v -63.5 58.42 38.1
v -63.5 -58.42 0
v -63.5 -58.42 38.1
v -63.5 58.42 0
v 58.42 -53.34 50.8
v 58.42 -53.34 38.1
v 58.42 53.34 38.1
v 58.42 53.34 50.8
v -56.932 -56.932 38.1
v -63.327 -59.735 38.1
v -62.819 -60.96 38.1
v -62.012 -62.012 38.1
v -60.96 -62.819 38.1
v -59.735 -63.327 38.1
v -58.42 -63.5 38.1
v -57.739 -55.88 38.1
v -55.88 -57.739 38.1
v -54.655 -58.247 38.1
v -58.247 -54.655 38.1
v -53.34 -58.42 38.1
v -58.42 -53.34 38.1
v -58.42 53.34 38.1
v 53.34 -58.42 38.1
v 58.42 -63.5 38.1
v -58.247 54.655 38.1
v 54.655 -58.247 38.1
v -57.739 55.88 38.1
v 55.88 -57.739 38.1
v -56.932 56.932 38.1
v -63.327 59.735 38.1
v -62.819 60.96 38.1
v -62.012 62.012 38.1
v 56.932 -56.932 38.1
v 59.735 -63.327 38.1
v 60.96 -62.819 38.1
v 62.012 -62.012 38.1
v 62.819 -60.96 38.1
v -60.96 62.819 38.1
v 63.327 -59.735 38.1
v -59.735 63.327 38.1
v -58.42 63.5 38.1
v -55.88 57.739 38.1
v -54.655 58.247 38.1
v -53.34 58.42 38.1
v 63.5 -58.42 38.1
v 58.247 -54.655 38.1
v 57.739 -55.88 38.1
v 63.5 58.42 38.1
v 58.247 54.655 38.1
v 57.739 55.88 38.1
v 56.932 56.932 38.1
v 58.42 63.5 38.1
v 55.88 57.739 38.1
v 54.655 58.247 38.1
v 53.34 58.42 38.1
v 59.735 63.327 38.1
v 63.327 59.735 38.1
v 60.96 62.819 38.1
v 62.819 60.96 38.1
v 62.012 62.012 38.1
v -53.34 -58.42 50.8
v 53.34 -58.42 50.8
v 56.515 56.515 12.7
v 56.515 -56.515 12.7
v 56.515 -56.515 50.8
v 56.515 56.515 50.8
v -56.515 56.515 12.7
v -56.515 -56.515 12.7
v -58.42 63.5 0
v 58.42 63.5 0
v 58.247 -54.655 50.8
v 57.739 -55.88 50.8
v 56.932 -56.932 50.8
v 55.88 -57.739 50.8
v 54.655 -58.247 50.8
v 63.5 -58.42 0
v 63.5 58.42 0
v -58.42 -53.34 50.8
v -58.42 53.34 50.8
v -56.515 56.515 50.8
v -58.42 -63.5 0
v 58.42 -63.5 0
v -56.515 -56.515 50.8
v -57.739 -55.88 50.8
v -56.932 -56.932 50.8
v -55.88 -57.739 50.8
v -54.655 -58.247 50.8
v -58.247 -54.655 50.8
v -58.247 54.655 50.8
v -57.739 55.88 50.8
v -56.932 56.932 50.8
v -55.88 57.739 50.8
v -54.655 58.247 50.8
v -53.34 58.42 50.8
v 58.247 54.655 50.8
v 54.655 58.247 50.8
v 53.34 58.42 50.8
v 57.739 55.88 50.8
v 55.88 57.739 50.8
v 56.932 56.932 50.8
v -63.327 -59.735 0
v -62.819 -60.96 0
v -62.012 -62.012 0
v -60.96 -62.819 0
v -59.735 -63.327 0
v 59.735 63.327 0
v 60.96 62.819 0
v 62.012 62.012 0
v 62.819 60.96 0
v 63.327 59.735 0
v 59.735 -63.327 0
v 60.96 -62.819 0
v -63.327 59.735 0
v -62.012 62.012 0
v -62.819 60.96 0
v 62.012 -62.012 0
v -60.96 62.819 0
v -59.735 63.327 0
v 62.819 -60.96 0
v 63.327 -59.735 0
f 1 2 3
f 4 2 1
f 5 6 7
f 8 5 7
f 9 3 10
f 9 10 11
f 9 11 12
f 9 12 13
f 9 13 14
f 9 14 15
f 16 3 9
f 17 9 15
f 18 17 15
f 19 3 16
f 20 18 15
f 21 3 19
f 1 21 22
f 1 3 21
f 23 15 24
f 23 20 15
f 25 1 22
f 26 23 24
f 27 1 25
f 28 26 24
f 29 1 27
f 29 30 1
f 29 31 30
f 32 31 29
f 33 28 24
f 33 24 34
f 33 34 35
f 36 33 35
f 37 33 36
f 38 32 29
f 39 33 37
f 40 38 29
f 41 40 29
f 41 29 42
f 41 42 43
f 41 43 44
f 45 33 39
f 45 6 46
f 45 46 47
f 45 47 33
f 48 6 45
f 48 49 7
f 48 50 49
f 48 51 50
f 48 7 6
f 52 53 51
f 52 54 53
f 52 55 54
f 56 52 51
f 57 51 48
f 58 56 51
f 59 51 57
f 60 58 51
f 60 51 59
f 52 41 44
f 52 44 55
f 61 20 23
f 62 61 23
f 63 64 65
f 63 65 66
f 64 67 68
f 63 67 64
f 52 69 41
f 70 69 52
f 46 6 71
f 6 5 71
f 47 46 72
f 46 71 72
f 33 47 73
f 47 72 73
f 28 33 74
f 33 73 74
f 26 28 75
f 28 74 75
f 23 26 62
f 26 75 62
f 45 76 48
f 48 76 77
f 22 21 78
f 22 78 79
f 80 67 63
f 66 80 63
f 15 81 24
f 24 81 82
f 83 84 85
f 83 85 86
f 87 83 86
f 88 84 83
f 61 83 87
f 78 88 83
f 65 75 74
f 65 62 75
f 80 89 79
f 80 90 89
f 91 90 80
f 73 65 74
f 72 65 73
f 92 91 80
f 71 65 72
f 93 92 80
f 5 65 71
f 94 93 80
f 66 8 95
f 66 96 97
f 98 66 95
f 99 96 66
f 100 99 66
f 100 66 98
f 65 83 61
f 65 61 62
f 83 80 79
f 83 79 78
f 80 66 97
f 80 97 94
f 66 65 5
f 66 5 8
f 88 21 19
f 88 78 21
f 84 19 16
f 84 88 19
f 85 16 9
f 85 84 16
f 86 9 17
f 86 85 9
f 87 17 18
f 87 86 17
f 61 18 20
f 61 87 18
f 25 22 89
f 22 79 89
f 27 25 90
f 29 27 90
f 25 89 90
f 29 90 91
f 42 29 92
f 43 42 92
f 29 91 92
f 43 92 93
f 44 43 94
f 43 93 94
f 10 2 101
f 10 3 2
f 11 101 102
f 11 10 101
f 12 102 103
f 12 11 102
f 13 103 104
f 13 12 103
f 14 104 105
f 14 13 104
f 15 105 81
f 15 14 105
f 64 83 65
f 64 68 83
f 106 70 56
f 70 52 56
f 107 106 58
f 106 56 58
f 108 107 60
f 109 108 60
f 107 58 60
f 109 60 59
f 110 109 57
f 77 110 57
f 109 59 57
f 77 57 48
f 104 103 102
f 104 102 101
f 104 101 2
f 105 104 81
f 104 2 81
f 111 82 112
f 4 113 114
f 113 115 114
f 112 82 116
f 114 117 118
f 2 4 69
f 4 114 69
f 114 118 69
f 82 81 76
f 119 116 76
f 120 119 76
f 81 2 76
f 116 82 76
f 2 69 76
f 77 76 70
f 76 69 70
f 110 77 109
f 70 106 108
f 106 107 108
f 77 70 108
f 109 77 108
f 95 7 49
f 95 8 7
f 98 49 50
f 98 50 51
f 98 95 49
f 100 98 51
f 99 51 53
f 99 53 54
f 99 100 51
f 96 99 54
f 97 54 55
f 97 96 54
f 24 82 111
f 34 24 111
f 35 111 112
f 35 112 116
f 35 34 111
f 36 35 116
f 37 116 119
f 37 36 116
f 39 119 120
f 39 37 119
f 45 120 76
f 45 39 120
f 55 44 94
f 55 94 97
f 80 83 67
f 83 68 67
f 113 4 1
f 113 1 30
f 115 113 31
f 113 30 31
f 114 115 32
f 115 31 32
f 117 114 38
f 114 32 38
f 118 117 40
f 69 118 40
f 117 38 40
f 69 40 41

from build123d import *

# Parameters (mm, degrees)
F0_W     = 127
F0_H     = 127
F0_W_2   = 113.03
F0_H_2   = 113.03
F1_DEPTH = 38.1
F2_W     = 113.03
F2_H     = 113.03
F3_DEPTH = 12.7
F4_R     = 5.08
F5_W     = 116.84
F5_H     = 116.84
F5_W_2   = 113.03
F5_H_2   = 113.03
F6_DEPTH = 12.7
F7_R     = 5.08


with BuildPart() as f1:
    # F0 (on Top) → F1 (new body)
    with BuildSketch(Plane.XY):
        Rectangle(F0_W, F0_H)
        Rectangle(F0_W_2, F0_H_2, mode=Mode.SUBTRACT)
    extrude(amount=F1_DEPTH)

    # F2 (on Top) → F3 (join)
    with BuildSketch(Plane.XY):
        Rectangle(F2_W, F2_H)
    extrude(amount=F3_DEPTH)

    # F4
    f4_edges = [f1.edges().sort_by_distance(p)[0] for p in [
        (-63.5, -63.5, 19.05),
        (-63.5, 63.5, 19.05),
        (63.5, 63.5, 19.05),
        (63.5, -63.5, 19.05),
    ]]
    fillet(f4_edges, radius=F4_R)

    # F5 (on face) → F6 (join)
    with BuildSketch(Plane.XY.offset(38.1)):
        Rectangle(F5_W, F5_H)
        Rectangle(F5_W_2, F5_H_2, mode=Mode.SUBTRACT)
    extrude(amount=F6_DEPTH)

    # F7
    f7_edges = [f1.edges().sort_by_distance(p)[0] for p in [
        (-58.42, -58.42, 44.45),
        (58.42, -58.42, 44.45),
        (58.42, 58.42, 44.45),
        (-58.42, 58.42, 44.45),
    ]]
    fillet(f7_edges, radius=F7_R)


solid = f1.part
